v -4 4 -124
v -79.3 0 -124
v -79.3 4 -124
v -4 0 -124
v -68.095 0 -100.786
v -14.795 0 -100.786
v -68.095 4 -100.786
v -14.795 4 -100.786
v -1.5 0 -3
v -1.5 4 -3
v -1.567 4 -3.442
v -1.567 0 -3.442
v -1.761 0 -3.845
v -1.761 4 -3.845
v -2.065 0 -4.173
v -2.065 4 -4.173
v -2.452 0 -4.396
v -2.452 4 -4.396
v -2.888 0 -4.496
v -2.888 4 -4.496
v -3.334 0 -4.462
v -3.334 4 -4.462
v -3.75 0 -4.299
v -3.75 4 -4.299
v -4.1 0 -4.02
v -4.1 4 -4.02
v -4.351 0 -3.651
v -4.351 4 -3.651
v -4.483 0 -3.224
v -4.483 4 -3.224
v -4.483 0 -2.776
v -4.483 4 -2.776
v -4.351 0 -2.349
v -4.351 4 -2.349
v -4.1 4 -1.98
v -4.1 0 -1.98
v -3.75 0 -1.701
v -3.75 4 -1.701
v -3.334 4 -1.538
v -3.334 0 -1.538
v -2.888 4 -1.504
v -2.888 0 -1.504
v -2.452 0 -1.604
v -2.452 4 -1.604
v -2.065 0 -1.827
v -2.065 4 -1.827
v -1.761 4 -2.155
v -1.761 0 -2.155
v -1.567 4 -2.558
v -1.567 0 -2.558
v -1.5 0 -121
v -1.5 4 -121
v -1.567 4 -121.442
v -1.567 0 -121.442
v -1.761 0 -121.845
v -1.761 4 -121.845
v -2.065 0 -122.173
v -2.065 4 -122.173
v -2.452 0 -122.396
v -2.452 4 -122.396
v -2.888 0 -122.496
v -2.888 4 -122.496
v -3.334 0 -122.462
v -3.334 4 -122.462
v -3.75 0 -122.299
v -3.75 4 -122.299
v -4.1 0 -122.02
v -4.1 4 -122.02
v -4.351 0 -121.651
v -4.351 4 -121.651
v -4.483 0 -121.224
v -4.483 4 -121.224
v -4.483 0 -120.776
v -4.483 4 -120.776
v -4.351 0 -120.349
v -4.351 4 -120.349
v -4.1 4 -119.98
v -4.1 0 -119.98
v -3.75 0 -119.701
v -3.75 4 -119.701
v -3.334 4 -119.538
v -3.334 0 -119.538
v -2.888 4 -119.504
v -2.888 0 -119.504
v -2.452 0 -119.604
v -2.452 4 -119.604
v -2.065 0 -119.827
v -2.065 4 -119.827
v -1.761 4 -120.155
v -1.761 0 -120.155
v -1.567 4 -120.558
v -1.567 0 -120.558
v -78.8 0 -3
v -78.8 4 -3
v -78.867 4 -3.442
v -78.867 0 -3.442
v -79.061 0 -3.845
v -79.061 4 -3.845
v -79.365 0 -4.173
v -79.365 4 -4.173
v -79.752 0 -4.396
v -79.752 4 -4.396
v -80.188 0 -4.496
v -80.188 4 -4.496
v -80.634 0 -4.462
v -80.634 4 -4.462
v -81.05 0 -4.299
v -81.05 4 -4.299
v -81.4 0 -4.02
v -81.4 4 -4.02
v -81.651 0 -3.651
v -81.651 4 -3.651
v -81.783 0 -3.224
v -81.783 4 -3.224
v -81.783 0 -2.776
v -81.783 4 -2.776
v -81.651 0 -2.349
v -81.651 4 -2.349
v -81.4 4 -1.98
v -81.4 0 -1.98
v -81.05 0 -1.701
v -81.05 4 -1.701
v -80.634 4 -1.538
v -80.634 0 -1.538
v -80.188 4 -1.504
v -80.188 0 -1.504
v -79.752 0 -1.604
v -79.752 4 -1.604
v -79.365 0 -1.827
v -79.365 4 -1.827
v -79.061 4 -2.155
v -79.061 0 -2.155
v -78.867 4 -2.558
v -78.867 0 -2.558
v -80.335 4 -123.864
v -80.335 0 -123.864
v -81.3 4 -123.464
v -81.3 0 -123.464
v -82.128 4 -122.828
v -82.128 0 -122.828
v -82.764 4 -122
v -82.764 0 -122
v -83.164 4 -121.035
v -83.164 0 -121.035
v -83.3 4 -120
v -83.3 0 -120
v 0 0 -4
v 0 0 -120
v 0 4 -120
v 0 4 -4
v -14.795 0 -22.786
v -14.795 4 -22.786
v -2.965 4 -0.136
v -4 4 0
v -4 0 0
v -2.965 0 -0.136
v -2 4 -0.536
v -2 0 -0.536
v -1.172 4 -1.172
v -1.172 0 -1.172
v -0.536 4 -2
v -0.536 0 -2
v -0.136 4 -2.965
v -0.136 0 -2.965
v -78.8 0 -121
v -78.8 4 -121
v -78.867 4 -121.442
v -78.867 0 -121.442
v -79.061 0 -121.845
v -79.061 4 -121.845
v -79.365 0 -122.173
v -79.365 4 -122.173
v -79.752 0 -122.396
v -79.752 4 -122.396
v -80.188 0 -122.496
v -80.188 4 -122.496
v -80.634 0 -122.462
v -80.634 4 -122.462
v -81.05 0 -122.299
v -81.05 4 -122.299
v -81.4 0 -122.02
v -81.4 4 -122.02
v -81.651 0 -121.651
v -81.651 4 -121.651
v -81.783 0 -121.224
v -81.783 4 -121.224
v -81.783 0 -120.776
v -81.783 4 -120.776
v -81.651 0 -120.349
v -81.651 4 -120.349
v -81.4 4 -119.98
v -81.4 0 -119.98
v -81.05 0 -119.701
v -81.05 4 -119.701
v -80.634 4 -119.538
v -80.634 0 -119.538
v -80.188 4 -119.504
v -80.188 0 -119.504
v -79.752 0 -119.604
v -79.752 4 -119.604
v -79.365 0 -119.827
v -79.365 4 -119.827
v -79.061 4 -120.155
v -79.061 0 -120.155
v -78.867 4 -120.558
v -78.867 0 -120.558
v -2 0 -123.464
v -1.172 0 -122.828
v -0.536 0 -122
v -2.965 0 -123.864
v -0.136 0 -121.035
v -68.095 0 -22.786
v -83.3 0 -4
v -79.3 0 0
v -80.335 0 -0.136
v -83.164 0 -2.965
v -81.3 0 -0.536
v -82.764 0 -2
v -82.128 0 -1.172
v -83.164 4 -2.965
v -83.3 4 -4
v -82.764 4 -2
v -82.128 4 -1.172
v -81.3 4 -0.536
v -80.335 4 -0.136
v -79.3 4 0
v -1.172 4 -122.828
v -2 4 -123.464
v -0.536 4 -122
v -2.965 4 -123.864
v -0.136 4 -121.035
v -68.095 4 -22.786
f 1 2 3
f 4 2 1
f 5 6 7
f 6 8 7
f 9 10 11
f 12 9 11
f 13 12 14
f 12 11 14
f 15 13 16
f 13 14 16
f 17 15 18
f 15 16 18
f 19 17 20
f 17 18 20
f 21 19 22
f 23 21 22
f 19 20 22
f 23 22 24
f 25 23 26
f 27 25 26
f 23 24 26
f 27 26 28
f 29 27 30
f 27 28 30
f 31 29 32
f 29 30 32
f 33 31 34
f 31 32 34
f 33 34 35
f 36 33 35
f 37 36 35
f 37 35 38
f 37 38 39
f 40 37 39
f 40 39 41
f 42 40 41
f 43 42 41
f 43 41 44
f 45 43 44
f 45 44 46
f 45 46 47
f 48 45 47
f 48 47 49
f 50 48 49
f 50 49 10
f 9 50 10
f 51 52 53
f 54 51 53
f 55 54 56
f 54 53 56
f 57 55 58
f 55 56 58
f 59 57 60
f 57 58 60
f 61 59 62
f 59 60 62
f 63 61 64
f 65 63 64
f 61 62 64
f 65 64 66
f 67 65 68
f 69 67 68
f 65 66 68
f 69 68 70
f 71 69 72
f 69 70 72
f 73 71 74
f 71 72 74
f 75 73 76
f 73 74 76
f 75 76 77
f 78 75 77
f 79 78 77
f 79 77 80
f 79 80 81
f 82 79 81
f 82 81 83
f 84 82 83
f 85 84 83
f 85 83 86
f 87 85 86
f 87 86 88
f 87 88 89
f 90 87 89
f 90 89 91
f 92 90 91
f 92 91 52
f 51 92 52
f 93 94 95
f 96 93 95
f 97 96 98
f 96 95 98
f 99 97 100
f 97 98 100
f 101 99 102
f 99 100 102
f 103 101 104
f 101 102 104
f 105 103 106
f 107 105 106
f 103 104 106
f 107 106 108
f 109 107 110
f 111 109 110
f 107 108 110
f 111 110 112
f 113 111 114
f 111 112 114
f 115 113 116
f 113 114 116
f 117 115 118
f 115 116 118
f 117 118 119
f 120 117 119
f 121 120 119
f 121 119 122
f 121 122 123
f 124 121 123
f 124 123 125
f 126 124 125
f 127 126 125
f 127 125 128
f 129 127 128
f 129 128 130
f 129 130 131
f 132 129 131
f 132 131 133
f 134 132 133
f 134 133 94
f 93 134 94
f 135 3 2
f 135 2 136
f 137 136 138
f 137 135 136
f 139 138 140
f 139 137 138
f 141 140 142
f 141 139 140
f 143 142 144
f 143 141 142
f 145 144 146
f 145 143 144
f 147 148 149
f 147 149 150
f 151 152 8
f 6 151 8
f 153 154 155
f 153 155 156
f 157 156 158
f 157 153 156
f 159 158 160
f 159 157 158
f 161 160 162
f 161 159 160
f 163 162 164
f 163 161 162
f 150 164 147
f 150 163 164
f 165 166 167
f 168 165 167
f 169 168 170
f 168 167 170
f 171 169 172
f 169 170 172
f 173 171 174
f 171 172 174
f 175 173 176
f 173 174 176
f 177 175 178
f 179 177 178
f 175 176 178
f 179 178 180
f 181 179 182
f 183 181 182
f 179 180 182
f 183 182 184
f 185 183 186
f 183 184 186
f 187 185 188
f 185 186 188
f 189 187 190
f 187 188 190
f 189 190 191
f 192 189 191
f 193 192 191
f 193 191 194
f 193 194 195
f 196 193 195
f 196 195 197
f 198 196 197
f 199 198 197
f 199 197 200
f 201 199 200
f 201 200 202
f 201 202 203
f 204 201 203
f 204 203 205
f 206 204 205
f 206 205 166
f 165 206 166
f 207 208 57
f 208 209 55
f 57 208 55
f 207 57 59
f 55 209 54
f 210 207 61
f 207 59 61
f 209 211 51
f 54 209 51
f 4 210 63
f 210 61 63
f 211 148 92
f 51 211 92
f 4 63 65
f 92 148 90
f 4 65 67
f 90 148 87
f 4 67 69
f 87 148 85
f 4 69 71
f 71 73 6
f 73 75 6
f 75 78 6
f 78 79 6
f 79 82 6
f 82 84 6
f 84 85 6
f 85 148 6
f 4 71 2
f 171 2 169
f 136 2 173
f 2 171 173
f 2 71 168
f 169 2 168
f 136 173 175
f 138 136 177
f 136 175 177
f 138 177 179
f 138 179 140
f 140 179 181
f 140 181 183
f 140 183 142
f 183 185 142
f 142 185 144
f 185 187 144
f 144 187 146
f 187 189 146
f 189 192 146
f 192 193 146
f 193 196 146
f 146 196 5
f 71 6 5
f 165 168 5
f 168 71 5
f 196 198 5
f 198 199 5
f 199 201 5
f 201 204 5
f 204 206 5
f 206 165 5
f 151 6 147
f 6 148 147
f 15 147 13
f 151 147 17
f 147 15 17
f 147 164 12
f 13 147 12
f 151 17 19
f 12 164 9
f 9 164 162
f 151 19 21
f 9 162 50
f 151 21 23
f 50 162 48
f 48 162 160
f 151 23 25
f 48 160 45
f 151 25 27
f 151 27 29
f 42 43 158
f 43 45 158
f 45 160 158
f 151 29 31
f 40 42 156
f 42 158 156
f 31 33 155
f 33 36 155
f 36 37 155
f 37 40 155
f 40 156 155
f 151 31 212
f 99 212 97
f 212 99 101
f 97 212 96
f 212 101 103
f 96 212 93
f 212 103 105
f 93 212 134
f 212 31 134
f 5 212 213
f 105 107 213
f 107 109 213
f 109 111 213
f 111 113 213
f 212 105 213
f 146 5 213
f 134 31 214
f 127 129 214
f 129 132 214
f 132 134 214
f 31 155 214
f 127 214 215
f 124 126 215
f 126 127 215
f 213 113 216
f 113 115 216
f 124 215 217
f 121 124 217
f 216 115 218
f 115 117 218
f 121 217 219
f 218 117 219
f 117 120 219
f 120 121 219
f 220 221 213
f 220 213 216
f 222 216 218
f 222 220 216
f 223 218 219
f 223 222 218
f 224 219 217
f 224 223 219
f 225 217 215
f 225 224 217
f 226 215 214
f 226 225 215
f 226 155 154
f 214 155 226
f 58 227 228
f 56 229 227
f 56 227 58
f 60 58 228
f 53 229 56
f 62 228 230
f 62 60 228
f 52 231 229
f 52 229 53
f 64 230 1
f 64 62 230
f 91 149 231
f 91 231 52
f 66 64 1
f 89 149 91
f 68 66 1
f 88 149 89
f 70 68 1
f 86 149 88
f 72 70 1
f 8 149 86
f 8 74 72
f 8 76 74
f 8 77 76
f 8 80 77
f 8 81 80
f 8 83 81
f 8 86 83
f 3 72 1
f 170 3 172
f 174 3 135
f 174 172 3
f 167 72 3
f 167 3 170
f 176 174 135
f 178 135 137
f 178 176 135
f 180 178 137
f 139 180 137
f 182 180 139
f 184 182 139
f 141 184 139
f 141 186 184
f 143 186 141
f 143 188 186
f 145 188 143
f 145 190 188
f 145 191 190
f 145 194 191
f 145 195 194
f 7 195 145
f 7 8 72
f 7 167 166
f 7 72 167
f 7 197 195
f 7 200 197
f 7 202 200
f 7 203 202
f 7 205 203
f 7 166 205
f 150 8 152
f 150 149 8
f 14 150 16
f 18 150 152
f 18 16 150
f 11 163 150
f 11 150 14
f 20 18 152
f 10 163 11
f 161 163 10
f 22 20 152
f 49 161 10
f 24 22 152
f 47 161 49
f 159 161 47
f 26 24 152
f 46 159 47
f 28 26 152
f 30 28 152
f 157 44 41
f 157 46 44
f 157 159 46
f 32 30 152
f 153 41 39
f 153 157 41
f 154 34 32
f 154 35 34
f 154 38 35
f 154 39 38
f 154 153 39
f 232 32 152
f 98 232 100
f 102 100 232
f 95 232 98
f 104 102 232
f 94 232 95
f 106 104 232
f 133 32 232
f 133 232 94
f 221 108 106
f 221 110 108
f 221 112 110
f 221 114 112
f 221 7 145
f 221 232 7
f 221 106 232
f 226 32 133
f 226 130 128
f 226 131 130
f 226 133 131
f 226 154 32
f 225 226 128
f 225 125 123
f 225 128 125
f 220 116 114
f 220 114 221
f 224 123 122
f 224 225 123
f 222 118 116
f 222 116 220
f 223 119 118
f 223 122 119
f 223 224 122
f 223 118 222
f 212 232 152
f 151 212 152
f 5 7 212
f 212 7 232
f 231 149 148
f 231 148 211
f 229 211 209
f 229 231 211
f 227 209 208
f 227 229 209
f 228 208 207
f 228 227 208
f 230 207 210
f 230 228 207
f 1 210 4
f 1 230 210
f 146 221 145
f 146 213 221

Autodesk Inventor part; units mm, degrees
ref_plane "YZ Plane" through (0, 0, 0) normal (1, 0, 0) x (0, 1, 0)
ref_plane "XZ Plane" through (0, 0, 0) normal (0, 1, 0) x (-1, 0, 0)
ref_plane "XY Plane" through (0, 0, 0) normal (0, 0, 1) x (1, 0, 0)
sketch "Sketch1" plane through (0, 0, 0) normal (0, 1, 0) x (-1, 0, 0)
  line L0 (0, 0) -> (83.3, 0)
  line L1 (83.3, 0) -> (83.3, -124)
  line L2 (83.3, -124) -> (0, -124)
  line L3 (0, -124) -> (0, 0)
  dimension "d0" = 124
  dimension "d1" = 83.3
extrude "Lid Body" add sketch "Sketch1" along normal blind 4
fillet "4mm Fillet" radius 4 4 edges at (0, 2, -124) (-83.3, 2, -124) (-83.3, 2, 0) (0, 2, 0)
sketch "Sketch2" plane through (0, 4, 0) normal (0, 1, 0) x (1, 0, 0)
  circle A0 centre (-80.3, 3) radius 1.5
  line L0 (-83.3, 124) -> (-83.3, 0) projected
  line L1 (-83.3, 0) -> (0, 0) projected
  line L2 (-83.3, 62) -> (0, 62)
  line L3 (0, 0) -> (0, 124) projected
  line L4 (-41.65, 0) -> (-41.65, 124)
  circle A1 centre (-80.3, 121) radius 1.5
  circle A2 centre (-3, 3) radius 1.5
  circle A3 centre (-3, 121) radius 1.5
  dimension "d5" = 3
  dimension "d6" = 3
  dimension "d7" = 3
extrude "Extrusion2" cut sketch "Sketch2" against normal through all contours A0 | A1 | A2 | A3
sketch "Sketch3" plane through (0, 4, 0) normal (0, 1, 0) x (1, 0, 0)
  line L0 (-83.3, 0) -> (0, 0) projected
  line L1 (0, 0) -> (0, 124) projected
  line L2 (0, 124) -> (-83.3, 124) projected
  line L3 (-83.3, 124) -> (-83.3, 0) projected
  line L4 (-78.3, 5) -> (-5, 5)
  line L5 (-5, 5) -> (-5, 119)
  line L6 (-5, 119) -> (-78.3, 119)
  line L7 (-78.3, 119) -> (-78.3, 5)
  line L8 (-68.095, 22.786) -> (-14.795, 22.786)
  line L9 (-14.795, 22.786) -> (-14.795, 100.786)
  line L10 (-14.795, 100.786) -> (-68.095, 100.786)
  line L11 (-68.095, 100.786) -> (-68.095, 22.786)
  dimension "d11" = 5
  dimension "d12" = 53.3
  dimension "d13" = 78
  dimension "d14" = 10.205
  dimension "d15" = 17.786
extrude "Extrusion3" cut sketch "Sketch3" against normal through all contours L11 L10 L9 L8
fillet "2mm Fillet" [suppressed]
properties part number "LidTest01"
